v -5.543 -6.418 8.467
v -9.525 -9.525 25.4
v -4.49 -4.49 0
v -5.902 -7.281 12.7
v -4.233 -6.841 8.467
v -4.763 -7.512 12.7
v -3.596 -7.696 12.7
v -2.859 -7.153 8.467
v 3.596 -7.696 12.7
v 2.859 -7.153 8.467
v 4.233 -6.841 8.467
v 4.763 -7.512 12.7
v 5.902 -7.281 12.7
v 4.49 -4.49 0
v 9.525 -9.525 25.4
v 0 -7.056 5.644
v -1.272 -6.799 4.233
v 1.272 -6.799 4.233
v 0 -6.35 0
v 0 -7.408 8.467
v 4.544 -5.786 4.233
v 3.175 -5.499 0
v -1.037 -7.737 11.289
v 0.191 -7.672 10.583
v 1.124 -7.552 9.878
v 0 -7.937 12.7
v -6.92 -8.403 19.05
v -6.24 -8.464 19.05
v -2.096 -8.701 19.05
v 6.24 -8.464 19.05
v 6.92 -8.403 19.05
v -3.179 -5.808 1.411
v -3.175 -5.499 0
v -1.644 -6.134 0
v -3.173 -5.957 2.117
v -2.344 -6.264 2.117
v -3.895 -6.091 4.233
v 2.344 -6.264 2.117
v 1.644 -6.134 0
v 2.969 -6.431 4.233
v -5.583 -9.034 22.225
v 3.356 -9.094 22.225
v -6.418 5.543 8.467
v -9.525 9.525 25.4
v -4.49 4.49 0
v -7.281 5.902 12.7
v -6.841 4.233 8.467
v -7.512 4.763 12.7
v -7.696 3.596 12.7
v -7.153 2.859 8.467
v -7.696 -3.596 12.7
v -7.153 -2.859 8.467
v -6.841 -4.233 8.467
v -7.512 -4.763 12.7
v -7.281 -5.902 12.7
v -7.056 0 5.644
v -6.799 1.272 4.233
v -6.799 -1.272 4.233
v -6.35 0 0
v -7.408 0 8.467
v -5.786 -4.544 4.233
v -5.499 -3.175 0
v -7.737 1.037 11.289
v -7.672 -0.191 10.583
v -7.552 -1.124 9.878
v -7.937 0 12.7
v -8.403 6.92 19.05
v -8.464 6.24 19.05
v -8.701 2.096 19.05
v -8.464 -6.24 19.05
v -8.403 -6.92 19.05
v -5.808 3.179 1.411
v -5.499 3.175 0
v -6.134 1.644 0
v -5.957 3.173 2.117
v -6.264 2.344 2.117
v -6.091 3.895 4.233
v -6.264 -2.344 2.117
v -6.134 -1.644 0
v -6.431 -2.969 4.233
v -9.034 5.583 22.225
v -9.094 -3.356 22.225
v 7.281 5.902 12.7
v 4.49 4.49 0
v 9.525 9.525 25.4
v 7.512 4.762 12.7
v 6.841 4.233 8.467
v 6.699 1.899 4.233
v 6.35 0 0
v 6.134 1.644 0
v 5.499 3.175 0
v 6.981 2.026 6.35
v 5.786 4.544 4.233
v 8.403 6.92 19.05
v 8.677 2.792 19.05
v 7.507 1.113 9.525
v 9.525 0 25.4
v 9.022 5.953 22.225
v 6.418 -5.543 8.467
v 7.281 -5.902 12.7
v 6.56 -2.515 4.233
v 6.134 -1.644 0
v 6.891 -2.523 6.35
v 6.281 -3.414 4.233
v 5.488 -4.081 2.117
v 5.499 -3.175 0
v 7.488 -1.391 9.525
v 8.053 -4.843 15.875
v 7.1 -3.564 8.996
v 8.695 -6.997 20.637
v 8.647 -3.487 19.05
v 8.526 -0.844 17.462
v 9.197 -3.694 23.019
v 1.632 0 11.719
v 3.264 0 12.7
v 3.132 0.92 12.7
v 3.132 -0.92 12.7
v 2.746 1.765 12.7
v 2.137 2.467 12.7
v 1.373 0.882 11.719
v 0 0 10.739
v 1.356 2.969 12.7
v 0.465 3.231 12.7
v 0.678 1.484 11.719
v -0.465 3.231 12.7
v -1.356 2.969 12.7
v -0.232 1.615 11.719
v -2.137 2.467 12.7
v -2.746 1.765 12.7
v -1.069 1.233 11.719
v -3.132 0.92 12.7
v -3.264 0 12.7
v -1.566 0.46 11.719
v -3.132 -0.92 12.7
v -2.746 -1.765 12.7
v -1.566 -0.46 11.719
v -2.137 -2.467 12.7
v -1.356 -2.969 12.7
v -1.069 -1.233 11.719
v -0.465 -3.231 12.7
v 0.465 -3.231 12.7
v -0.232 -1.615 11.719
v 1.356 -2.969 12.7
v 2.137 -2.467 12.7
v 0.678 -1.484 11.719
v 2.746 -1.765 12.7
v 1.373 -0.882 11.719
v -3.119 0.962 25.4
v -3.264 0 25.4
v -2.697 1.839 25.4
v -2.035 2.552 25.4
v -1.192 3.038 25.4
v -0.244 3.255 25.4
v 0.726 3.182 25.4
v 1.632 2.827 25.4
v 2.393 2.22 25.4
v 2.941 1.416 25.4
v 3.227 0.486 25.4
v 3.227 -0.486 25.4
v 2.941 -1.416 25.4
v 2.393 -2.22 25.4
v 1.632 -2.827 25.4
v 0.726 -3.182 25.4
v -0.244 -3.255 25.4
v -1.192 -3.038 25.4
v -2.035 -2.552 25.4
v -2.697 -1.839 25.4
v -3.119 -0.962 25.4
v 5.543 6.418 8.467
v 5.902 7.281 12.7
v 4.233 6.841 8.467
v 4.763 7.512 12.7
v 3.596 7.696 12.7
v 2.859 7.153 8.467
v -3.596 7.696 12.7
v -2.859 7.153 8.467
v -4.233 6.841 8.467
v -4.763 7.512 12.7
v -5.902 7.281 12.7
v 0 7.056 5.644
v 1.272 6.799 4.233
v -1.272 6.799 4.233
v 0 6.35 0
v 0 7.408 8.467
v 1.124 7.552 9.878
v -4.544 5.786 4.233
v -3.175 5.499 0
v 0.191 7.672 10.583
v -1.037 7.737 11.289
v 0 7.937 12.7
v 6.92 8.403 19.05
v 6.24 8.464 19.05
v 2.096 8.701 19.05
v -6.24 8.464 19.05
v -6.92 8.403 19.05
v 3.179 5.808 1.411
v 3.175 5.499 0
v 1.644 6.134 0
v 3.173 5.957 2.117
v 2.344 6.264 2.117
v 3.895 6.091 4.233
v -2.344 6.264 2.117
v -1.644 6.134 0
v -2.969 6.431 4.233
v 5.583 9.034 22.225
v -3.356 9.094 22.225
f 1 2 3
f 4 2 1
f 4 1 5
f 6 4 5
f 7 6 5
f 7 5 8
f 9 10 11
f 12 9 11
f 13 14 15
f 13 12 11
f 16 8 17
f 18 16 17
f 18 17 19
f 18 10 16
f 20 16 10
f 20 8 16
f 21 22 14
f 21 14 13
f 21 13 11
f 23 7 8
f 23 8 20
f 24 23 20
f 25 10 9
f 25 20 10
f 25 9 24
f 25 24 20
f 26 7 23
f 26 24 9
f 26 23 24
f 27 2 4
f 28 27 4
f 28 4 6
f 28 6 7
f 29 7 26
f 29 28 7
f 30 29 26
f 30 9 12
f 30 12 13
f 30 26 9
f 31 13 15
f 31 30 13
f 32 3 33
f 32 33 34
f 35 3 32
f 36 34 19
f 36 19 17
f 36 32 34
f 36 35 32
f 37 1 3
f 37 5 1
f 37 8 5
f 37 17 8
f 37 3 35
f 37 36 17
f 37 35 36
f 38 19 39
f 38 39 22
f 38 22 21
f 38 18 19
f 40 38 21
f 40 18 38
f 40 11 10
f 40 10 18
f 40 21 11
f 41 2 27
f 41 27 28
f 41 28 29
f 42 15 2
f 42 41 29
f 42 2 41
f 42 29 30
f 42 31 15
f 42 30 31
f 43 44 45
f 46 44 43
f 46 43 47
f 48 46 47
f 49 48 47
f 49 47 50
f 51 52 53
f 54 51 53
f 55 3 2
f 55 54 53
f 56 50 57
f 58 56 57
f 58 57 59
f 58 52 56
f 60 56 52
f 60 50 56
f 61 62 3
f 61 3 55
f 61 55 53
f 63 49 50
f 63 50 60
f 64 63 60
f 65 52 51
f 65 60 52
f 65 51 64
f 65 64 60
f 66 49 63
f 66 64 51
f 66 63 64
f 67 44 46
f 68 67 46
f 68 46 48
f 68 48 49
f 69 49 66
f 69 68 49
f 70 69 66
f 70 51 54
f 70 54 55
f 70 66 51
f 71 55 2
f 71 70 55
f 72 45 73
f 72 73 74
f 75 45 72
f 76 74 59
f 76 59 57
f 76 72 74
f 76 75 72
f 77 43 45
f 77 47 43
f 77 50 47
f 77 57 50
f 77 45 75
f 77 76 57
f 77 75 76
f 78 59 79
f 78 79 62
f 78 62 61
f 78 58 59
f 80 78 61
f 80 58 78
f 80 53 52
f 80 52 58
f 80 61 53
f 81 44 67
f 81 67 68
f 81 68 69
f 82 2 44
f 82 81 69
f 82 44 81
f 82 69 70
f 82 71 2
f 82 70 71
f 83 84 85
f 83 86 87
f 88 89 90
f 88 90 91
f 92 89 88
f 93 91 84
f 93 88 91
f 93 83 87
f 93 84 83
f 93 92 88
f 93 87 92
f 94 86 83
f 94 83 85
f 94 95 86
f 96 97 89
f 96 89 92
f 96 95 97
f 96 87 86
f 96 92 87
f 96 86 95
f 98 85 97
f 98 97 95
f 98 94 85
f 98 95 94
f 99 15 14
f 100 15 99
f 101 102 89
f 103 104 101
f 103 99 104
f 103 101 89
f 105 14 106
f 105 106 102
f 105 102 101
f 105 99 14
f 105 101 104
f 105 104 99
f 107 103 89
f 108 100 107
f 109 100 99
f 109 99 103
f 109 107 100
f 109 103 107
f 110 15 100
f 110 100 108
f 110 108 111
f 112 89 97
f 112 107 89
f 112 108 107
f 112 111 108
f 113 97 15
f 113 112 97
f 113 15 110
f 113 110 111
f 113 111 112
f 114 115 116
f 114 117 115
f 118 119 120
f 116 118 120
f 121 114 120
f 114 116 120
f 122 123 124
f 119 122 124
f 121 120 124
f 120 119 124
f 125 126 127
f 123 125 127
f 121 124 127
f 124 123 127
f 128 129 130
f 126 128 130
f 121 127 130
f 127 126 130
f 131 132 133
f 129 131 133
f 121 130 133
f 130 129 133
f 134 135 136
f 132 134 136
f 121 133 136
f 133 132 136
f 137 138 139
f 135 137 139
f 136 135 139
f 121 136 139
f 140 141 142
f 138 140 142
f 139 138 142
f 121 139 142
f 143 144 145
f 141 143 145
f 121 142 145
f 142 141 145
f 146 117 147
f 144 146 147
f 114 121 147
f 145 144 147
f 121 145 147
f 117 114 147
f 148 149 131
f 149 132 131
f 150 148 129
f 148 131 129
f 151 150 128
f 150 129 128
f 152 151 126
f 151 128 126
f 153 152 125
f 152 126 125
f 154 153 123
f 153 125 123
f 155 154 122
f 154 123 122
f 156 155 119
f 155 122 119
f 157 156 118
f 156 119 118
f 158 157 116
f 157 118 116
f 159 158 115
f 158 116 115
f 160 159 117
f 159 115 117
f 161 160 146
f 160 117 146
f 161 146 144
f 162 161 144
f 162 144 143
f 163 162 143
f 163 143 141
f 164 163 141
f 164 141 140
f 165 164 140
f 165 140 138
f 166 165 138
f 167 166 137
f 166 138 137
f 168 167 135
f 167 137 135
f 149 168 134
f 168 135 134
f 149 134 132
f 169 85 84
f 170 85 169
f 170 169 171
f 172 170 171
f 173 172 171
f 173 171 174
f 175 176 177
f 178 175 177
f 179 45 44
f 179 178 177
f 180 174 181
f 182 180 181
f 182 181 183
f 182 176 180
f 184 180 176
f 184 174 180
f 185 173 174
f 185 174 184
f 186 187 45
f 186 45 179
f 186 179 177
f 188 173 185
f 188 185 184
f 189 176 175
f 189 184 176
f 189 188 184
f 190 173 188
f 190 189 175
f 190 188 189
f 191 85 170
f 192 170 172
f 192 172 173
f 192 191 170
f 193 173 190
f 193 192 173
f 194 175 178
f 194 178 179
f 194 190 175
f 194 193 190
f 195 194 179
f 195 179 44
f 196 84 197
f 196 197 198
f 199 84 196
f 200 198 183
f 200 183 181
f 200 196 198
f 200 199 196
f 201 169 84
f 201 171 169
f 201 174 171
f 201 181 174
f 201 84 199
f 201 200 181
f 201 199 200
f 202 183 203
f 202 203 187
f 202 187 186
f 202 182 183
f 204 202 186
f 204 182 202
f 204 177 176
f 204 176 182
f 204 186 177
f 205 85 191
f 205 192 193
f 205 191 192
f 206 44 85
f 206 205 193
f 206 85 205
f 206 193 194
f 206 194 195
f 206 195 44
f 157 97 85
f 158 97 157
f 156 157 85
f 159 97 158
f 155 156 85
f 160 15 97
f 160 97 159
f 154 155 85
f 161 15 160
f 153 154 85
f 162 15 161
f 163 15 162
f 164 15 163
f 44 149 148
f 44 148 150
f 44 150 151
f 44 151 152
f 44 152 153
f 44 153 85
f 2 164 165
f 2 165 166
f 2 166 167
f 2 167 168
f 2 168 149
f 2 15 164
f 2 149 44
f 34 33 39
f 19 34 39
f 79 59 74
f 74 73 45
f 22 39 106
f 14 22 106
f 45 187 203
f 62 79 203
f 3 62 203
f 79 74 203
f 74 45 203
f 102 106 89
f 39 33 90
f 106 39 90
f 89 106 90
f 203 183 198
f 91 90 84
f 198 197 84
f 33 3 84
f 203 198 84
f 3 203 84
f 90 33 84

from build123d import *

# Parameters (mm, degrees)
F0_R     = 6.35
F2_W     = 19.05
F2_H     = 19.05
F5_D     = 6.5278
F5_DEPTH = 12.7
F5_TIP   = 1.9611489744


with BuildPart() as f3:
    # F0 (on Top) → F3 section 0
    with BuildSketch(Plane.XY):
        Circle(F0_R)
    # F2 (on offset) → F3 section 1
    with BuildSketch(Plane.XY.offset(25.4)):
        Rectangle(F2_W, F2_H)
    loft()

    # F5
    with Locations(Plane.XY.offset(25.4)):
        with Locations((0, 0)):
            Hole(F5_D / 2, depth=F5_DEPTH)
            with Locations((0, 0, -(F5_DEPTH + F5_TIP / 2))):  # 118° drill point
                Cone(0, F5_D / 2, F5_TIP, mode=Mode.SUBTRACT)


solid = f3.part
